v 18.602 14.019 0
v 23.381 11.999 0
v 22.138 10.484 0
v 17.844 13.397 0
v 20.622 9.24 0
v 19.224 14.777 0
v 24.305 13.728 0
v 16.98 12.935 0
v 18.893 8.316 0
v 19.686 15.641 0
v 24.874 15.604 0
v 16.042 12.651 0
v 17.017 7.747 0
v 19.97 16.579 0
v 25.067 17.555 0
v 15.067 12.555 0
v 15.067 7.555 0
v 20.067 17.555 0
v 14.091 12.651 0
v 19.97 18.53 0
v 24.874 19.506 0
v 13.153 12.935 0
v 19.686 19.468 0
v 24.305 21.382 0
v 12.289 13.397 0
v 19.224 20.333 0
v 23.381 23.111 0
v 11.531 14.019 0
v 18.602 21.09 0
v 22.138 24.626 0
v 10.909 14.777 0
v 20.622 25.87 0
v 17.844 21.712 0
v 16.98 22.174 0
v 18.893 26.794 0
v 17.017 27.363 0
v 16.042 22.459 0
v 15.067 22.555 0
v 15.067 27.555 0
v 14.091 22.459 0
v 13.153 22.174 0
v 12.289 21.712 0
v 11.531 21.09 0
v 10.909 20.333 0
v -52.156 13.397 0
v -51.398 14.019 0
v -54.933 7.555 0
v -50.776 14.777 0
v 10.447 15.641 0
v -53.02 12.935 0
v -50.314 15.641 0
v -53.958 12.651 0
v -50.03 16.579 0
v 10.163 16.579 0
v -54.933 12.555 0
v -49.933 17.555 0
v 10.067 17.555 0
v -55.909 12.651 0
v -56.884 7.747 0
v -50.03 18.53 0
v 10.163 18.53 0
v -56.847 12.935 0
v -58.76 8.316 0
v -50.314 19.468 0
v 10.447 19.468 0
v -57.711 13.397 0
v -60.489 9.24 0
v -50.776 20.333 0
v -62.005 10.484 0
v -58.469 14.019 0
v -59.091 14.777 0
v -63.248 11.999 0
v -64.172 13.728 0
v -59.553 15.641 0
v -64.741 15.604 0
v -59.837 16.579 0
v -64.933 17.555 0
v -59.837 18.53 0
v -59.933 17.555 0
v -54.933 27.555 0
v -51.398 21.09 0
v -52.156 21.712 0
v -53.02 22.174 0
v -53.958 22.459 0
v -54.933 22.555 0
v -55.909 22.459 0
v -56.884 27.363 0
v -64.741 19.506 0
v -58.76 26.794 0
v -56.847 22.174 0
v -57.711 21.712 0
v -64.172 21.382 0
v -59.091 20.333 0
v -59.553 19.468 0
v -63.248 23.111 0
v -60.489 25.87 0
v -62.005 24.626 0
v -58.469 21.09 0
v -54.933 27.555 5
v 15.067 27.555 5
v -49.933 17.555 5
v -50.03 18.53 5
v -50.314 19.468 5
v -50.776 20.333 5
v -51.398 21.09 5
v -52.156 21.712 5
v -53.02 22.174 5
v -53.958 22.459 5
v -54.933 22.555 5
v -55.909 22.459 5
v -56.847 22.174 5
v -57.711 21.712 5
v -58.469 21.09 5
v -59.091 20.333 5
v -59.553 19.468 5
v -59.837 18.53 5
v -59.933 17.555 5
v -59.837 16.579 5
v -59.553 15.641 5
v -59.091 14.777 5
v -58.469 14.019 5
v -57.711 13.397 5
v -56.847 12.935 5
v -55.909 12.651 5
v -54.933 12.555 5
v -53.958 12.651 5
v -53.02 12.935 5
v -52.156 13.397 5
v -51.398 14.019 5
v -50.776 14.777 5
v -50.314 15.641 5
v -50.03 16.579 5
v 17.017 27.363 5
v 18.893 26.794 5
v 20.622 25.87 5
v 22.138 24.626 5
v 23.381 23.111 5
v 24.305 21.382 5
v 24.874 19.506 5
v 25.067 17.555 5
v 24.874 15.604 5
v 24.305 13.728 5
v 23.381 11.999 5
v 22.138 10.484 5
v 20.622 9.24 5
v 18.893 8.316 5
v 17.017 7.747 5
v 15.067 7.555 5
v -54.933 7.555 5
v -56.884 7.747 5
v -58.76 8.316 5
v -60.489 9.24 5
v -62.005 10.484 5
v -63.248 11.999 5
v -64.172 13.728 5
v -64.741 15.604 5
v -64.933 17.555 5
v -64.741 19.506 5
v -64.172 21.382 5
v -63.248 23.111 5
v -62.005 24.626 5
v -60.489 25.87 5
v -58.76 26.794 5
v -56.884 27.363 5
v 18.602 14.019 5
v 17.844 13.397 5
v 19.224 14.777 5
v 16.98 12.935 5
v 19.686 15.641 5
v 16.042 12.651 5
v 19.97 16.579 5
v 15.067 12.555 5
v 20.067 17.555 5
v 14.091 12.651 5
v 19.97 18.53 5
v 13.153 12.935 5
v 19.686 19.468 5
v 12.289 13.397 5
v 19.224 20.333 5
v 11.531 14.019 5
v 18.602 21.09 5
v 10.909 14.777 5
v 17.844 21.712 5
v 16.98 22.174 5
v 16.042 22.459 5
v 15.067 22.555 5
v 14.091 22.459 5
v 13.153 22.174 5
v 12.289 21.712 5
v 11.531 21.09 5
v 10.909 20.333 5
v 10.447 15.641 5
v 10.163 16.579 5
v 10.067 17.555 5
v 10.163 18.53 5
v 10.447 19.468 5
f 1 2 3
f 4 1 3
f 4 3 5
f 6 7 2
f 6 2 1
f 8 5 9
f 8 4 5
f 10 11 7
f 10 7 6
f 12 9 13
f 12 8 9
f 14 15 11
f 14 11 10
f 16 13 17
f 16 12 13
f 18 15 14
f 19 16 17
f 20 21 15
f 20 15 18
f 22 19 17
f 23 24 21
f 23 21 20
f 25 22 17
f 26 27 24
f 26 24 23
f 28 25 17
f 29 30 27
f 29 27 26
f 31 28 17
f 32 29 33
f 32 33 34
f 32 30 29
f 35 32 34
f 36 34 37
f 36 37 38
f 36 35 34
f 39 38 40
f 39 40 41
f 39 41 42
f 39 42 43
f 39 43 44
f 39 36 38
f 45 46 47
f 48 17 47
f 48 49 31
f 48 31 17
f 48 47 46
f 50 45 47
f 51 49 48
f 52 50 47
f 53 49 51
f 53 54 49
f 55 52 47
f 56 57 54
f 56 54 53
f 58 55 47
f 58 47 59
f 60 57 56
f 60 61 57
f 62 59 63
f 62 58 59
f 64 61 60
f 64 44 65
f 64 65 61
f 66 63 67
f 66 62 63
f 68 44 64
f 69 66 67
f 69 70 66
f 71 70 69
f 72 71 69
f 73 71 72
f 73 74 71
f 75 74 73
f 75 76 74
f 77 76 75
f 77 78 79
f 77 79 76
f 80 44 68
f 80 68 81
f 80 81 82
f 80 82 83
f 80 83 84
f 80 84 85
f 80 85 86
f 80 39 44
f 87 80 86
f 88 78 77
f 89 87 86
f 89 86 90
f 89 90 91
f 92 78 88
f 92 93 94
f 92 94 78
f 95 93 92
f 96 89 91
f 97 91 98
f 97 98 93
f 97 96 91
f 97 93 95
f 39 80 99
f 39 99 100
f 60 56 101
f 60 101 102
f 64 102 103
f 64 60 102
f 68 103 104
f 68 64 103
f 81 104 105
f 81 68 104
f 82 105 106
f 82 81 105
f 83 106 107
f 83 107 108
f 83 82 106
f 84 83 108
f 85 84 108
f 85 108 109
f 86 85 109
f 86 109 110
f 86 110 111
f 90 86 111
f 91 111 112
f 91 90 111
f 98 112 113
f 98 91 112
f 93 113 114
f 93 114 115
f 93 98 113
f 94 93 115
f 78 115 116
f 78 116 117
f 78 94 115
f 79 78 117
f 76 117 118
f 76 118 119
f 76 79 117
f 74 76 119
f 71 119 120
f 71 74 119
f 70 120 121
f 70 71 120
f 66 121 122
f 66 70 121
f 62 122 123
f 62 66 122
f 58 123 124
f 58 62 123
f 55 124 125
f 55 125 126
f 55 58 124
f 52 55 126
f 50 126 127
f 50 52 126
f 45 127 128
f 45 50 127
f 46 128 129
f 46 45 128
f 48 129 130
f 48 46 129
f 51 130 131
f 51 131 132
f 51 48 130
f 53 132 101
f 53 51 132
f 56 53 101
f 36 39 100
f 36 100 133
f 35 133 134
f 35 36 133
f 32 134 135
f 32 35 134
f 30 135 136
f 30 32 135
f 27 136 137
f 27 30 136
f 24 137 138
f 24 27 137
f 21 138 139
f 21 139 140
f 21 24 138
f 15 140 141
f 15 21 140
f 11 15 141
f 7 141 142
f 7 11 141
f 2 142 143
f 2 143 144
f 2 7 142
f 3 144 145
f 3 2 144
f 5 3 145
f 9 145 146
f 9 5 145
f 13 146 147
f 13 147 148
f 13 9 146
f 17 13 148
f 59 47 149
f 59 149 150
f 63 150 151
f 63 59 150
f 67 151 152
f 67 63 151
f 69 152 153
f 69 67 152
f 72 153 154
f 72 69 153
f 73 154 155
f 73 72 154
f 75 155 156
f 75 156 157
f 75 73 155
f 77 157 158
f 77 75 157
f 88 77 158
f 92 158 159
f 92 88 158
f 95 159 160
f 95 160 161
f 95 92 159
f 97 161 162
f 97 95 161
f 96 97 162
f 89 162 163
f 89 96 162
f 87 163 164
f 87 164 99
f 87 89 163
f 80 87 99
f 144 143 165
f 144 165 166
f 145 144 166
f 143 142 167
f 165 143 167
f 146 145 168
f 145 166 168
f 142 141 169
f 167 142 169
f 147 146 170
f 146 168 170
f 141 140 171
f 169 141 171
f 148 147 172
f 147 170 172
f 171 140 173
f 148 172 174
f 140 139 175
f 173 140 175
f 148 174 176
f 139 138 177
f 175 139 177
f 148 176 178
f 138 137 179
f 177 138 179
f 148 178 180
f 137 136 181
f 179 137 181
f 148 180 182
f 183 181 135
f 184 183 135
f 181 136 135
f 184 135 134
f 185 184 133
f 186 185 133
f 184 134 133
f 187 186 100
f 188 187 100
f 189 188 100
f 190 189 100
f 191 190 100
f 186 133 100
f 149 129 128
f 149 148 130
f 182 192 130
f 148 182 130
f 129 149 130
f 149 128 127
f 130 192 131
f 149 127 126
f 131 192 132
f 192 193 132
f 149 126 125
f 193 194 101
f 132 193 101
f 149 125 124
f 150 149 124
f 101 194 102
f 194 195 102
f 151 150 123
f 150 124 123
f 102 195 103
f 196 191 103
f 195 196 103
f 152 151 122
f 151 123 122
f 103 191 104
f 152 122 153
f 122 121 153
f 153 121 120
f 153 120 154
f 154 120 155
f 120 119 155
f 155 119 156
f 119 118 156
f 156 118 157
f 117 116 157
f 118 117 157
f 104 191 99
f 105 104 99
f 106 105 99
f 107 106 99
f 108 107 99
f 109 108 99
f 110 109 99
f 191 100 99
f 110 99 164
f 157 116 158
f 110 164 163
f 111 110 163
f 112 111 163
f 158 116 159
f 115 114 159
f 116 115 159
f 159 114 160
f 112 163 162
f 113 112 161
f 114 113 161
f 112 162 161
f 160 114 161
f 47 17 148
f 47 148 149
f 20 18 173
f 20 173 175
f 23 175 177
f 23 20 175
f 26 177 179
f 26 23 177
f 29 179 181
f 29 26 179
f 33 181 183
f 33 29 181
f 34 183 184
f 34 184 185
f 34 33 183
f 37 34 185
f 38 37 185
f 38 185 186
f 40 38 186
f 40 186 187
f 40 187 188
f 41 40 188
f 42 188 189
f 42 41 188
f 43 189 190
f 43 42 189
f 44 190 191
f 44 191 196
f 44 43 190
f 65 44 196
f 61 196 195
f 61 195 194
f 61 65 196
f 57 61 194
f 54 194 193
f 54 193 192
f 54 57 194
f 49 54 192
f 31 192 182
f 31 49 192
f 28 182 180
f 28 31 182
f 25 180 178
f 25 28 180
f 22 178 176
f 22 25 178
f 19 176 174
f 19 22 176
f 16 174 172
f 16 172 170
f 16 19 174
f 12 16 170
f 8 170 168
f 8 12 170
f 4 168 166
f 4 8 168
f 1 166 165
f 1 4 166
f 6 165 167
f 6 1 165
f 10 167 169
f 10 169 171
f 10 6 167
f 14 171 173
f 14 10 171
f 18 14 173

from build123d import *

# Parameters (mm, degrees)
SKETCH1_R           = 5
BOSS_EXTRUDE1_DEPTH = 5


with BuildPart() as part:
    # Sketch1 → Boss-Extrude1 (new body)
    with BuildSketch(Plane.XY):
        with BuildLine():
            Line((-54.933450377, 27.554820012), (15.066549623, 27.554820012))
            ThreePointArc((15.066549623, 27.554820012), (25.066549623, 17.554820012), (15.066549623, 7.554820012))
            Line((15.066549623, 7.554820012), (-54.933450377, 7.554820012))
            ThreePointArc((-54.933450377, 7.554820012), (-64.933450377, 17.554820012), (-54.933450377, 27.554820012))
        make_face()
        with Locations((-54.933450377, 17.554820012)):
            Circle(SKETCH1_R, mode=Mode.SUBTRACT)
        with Locations((15.066549623, 17.554820012)):
            Circle(SKETCH1_R, mode=Mode.SUBTRACT)
    extrude(amount=BOSS_EXTRUDE1_DEPTH)


solid = part.part
